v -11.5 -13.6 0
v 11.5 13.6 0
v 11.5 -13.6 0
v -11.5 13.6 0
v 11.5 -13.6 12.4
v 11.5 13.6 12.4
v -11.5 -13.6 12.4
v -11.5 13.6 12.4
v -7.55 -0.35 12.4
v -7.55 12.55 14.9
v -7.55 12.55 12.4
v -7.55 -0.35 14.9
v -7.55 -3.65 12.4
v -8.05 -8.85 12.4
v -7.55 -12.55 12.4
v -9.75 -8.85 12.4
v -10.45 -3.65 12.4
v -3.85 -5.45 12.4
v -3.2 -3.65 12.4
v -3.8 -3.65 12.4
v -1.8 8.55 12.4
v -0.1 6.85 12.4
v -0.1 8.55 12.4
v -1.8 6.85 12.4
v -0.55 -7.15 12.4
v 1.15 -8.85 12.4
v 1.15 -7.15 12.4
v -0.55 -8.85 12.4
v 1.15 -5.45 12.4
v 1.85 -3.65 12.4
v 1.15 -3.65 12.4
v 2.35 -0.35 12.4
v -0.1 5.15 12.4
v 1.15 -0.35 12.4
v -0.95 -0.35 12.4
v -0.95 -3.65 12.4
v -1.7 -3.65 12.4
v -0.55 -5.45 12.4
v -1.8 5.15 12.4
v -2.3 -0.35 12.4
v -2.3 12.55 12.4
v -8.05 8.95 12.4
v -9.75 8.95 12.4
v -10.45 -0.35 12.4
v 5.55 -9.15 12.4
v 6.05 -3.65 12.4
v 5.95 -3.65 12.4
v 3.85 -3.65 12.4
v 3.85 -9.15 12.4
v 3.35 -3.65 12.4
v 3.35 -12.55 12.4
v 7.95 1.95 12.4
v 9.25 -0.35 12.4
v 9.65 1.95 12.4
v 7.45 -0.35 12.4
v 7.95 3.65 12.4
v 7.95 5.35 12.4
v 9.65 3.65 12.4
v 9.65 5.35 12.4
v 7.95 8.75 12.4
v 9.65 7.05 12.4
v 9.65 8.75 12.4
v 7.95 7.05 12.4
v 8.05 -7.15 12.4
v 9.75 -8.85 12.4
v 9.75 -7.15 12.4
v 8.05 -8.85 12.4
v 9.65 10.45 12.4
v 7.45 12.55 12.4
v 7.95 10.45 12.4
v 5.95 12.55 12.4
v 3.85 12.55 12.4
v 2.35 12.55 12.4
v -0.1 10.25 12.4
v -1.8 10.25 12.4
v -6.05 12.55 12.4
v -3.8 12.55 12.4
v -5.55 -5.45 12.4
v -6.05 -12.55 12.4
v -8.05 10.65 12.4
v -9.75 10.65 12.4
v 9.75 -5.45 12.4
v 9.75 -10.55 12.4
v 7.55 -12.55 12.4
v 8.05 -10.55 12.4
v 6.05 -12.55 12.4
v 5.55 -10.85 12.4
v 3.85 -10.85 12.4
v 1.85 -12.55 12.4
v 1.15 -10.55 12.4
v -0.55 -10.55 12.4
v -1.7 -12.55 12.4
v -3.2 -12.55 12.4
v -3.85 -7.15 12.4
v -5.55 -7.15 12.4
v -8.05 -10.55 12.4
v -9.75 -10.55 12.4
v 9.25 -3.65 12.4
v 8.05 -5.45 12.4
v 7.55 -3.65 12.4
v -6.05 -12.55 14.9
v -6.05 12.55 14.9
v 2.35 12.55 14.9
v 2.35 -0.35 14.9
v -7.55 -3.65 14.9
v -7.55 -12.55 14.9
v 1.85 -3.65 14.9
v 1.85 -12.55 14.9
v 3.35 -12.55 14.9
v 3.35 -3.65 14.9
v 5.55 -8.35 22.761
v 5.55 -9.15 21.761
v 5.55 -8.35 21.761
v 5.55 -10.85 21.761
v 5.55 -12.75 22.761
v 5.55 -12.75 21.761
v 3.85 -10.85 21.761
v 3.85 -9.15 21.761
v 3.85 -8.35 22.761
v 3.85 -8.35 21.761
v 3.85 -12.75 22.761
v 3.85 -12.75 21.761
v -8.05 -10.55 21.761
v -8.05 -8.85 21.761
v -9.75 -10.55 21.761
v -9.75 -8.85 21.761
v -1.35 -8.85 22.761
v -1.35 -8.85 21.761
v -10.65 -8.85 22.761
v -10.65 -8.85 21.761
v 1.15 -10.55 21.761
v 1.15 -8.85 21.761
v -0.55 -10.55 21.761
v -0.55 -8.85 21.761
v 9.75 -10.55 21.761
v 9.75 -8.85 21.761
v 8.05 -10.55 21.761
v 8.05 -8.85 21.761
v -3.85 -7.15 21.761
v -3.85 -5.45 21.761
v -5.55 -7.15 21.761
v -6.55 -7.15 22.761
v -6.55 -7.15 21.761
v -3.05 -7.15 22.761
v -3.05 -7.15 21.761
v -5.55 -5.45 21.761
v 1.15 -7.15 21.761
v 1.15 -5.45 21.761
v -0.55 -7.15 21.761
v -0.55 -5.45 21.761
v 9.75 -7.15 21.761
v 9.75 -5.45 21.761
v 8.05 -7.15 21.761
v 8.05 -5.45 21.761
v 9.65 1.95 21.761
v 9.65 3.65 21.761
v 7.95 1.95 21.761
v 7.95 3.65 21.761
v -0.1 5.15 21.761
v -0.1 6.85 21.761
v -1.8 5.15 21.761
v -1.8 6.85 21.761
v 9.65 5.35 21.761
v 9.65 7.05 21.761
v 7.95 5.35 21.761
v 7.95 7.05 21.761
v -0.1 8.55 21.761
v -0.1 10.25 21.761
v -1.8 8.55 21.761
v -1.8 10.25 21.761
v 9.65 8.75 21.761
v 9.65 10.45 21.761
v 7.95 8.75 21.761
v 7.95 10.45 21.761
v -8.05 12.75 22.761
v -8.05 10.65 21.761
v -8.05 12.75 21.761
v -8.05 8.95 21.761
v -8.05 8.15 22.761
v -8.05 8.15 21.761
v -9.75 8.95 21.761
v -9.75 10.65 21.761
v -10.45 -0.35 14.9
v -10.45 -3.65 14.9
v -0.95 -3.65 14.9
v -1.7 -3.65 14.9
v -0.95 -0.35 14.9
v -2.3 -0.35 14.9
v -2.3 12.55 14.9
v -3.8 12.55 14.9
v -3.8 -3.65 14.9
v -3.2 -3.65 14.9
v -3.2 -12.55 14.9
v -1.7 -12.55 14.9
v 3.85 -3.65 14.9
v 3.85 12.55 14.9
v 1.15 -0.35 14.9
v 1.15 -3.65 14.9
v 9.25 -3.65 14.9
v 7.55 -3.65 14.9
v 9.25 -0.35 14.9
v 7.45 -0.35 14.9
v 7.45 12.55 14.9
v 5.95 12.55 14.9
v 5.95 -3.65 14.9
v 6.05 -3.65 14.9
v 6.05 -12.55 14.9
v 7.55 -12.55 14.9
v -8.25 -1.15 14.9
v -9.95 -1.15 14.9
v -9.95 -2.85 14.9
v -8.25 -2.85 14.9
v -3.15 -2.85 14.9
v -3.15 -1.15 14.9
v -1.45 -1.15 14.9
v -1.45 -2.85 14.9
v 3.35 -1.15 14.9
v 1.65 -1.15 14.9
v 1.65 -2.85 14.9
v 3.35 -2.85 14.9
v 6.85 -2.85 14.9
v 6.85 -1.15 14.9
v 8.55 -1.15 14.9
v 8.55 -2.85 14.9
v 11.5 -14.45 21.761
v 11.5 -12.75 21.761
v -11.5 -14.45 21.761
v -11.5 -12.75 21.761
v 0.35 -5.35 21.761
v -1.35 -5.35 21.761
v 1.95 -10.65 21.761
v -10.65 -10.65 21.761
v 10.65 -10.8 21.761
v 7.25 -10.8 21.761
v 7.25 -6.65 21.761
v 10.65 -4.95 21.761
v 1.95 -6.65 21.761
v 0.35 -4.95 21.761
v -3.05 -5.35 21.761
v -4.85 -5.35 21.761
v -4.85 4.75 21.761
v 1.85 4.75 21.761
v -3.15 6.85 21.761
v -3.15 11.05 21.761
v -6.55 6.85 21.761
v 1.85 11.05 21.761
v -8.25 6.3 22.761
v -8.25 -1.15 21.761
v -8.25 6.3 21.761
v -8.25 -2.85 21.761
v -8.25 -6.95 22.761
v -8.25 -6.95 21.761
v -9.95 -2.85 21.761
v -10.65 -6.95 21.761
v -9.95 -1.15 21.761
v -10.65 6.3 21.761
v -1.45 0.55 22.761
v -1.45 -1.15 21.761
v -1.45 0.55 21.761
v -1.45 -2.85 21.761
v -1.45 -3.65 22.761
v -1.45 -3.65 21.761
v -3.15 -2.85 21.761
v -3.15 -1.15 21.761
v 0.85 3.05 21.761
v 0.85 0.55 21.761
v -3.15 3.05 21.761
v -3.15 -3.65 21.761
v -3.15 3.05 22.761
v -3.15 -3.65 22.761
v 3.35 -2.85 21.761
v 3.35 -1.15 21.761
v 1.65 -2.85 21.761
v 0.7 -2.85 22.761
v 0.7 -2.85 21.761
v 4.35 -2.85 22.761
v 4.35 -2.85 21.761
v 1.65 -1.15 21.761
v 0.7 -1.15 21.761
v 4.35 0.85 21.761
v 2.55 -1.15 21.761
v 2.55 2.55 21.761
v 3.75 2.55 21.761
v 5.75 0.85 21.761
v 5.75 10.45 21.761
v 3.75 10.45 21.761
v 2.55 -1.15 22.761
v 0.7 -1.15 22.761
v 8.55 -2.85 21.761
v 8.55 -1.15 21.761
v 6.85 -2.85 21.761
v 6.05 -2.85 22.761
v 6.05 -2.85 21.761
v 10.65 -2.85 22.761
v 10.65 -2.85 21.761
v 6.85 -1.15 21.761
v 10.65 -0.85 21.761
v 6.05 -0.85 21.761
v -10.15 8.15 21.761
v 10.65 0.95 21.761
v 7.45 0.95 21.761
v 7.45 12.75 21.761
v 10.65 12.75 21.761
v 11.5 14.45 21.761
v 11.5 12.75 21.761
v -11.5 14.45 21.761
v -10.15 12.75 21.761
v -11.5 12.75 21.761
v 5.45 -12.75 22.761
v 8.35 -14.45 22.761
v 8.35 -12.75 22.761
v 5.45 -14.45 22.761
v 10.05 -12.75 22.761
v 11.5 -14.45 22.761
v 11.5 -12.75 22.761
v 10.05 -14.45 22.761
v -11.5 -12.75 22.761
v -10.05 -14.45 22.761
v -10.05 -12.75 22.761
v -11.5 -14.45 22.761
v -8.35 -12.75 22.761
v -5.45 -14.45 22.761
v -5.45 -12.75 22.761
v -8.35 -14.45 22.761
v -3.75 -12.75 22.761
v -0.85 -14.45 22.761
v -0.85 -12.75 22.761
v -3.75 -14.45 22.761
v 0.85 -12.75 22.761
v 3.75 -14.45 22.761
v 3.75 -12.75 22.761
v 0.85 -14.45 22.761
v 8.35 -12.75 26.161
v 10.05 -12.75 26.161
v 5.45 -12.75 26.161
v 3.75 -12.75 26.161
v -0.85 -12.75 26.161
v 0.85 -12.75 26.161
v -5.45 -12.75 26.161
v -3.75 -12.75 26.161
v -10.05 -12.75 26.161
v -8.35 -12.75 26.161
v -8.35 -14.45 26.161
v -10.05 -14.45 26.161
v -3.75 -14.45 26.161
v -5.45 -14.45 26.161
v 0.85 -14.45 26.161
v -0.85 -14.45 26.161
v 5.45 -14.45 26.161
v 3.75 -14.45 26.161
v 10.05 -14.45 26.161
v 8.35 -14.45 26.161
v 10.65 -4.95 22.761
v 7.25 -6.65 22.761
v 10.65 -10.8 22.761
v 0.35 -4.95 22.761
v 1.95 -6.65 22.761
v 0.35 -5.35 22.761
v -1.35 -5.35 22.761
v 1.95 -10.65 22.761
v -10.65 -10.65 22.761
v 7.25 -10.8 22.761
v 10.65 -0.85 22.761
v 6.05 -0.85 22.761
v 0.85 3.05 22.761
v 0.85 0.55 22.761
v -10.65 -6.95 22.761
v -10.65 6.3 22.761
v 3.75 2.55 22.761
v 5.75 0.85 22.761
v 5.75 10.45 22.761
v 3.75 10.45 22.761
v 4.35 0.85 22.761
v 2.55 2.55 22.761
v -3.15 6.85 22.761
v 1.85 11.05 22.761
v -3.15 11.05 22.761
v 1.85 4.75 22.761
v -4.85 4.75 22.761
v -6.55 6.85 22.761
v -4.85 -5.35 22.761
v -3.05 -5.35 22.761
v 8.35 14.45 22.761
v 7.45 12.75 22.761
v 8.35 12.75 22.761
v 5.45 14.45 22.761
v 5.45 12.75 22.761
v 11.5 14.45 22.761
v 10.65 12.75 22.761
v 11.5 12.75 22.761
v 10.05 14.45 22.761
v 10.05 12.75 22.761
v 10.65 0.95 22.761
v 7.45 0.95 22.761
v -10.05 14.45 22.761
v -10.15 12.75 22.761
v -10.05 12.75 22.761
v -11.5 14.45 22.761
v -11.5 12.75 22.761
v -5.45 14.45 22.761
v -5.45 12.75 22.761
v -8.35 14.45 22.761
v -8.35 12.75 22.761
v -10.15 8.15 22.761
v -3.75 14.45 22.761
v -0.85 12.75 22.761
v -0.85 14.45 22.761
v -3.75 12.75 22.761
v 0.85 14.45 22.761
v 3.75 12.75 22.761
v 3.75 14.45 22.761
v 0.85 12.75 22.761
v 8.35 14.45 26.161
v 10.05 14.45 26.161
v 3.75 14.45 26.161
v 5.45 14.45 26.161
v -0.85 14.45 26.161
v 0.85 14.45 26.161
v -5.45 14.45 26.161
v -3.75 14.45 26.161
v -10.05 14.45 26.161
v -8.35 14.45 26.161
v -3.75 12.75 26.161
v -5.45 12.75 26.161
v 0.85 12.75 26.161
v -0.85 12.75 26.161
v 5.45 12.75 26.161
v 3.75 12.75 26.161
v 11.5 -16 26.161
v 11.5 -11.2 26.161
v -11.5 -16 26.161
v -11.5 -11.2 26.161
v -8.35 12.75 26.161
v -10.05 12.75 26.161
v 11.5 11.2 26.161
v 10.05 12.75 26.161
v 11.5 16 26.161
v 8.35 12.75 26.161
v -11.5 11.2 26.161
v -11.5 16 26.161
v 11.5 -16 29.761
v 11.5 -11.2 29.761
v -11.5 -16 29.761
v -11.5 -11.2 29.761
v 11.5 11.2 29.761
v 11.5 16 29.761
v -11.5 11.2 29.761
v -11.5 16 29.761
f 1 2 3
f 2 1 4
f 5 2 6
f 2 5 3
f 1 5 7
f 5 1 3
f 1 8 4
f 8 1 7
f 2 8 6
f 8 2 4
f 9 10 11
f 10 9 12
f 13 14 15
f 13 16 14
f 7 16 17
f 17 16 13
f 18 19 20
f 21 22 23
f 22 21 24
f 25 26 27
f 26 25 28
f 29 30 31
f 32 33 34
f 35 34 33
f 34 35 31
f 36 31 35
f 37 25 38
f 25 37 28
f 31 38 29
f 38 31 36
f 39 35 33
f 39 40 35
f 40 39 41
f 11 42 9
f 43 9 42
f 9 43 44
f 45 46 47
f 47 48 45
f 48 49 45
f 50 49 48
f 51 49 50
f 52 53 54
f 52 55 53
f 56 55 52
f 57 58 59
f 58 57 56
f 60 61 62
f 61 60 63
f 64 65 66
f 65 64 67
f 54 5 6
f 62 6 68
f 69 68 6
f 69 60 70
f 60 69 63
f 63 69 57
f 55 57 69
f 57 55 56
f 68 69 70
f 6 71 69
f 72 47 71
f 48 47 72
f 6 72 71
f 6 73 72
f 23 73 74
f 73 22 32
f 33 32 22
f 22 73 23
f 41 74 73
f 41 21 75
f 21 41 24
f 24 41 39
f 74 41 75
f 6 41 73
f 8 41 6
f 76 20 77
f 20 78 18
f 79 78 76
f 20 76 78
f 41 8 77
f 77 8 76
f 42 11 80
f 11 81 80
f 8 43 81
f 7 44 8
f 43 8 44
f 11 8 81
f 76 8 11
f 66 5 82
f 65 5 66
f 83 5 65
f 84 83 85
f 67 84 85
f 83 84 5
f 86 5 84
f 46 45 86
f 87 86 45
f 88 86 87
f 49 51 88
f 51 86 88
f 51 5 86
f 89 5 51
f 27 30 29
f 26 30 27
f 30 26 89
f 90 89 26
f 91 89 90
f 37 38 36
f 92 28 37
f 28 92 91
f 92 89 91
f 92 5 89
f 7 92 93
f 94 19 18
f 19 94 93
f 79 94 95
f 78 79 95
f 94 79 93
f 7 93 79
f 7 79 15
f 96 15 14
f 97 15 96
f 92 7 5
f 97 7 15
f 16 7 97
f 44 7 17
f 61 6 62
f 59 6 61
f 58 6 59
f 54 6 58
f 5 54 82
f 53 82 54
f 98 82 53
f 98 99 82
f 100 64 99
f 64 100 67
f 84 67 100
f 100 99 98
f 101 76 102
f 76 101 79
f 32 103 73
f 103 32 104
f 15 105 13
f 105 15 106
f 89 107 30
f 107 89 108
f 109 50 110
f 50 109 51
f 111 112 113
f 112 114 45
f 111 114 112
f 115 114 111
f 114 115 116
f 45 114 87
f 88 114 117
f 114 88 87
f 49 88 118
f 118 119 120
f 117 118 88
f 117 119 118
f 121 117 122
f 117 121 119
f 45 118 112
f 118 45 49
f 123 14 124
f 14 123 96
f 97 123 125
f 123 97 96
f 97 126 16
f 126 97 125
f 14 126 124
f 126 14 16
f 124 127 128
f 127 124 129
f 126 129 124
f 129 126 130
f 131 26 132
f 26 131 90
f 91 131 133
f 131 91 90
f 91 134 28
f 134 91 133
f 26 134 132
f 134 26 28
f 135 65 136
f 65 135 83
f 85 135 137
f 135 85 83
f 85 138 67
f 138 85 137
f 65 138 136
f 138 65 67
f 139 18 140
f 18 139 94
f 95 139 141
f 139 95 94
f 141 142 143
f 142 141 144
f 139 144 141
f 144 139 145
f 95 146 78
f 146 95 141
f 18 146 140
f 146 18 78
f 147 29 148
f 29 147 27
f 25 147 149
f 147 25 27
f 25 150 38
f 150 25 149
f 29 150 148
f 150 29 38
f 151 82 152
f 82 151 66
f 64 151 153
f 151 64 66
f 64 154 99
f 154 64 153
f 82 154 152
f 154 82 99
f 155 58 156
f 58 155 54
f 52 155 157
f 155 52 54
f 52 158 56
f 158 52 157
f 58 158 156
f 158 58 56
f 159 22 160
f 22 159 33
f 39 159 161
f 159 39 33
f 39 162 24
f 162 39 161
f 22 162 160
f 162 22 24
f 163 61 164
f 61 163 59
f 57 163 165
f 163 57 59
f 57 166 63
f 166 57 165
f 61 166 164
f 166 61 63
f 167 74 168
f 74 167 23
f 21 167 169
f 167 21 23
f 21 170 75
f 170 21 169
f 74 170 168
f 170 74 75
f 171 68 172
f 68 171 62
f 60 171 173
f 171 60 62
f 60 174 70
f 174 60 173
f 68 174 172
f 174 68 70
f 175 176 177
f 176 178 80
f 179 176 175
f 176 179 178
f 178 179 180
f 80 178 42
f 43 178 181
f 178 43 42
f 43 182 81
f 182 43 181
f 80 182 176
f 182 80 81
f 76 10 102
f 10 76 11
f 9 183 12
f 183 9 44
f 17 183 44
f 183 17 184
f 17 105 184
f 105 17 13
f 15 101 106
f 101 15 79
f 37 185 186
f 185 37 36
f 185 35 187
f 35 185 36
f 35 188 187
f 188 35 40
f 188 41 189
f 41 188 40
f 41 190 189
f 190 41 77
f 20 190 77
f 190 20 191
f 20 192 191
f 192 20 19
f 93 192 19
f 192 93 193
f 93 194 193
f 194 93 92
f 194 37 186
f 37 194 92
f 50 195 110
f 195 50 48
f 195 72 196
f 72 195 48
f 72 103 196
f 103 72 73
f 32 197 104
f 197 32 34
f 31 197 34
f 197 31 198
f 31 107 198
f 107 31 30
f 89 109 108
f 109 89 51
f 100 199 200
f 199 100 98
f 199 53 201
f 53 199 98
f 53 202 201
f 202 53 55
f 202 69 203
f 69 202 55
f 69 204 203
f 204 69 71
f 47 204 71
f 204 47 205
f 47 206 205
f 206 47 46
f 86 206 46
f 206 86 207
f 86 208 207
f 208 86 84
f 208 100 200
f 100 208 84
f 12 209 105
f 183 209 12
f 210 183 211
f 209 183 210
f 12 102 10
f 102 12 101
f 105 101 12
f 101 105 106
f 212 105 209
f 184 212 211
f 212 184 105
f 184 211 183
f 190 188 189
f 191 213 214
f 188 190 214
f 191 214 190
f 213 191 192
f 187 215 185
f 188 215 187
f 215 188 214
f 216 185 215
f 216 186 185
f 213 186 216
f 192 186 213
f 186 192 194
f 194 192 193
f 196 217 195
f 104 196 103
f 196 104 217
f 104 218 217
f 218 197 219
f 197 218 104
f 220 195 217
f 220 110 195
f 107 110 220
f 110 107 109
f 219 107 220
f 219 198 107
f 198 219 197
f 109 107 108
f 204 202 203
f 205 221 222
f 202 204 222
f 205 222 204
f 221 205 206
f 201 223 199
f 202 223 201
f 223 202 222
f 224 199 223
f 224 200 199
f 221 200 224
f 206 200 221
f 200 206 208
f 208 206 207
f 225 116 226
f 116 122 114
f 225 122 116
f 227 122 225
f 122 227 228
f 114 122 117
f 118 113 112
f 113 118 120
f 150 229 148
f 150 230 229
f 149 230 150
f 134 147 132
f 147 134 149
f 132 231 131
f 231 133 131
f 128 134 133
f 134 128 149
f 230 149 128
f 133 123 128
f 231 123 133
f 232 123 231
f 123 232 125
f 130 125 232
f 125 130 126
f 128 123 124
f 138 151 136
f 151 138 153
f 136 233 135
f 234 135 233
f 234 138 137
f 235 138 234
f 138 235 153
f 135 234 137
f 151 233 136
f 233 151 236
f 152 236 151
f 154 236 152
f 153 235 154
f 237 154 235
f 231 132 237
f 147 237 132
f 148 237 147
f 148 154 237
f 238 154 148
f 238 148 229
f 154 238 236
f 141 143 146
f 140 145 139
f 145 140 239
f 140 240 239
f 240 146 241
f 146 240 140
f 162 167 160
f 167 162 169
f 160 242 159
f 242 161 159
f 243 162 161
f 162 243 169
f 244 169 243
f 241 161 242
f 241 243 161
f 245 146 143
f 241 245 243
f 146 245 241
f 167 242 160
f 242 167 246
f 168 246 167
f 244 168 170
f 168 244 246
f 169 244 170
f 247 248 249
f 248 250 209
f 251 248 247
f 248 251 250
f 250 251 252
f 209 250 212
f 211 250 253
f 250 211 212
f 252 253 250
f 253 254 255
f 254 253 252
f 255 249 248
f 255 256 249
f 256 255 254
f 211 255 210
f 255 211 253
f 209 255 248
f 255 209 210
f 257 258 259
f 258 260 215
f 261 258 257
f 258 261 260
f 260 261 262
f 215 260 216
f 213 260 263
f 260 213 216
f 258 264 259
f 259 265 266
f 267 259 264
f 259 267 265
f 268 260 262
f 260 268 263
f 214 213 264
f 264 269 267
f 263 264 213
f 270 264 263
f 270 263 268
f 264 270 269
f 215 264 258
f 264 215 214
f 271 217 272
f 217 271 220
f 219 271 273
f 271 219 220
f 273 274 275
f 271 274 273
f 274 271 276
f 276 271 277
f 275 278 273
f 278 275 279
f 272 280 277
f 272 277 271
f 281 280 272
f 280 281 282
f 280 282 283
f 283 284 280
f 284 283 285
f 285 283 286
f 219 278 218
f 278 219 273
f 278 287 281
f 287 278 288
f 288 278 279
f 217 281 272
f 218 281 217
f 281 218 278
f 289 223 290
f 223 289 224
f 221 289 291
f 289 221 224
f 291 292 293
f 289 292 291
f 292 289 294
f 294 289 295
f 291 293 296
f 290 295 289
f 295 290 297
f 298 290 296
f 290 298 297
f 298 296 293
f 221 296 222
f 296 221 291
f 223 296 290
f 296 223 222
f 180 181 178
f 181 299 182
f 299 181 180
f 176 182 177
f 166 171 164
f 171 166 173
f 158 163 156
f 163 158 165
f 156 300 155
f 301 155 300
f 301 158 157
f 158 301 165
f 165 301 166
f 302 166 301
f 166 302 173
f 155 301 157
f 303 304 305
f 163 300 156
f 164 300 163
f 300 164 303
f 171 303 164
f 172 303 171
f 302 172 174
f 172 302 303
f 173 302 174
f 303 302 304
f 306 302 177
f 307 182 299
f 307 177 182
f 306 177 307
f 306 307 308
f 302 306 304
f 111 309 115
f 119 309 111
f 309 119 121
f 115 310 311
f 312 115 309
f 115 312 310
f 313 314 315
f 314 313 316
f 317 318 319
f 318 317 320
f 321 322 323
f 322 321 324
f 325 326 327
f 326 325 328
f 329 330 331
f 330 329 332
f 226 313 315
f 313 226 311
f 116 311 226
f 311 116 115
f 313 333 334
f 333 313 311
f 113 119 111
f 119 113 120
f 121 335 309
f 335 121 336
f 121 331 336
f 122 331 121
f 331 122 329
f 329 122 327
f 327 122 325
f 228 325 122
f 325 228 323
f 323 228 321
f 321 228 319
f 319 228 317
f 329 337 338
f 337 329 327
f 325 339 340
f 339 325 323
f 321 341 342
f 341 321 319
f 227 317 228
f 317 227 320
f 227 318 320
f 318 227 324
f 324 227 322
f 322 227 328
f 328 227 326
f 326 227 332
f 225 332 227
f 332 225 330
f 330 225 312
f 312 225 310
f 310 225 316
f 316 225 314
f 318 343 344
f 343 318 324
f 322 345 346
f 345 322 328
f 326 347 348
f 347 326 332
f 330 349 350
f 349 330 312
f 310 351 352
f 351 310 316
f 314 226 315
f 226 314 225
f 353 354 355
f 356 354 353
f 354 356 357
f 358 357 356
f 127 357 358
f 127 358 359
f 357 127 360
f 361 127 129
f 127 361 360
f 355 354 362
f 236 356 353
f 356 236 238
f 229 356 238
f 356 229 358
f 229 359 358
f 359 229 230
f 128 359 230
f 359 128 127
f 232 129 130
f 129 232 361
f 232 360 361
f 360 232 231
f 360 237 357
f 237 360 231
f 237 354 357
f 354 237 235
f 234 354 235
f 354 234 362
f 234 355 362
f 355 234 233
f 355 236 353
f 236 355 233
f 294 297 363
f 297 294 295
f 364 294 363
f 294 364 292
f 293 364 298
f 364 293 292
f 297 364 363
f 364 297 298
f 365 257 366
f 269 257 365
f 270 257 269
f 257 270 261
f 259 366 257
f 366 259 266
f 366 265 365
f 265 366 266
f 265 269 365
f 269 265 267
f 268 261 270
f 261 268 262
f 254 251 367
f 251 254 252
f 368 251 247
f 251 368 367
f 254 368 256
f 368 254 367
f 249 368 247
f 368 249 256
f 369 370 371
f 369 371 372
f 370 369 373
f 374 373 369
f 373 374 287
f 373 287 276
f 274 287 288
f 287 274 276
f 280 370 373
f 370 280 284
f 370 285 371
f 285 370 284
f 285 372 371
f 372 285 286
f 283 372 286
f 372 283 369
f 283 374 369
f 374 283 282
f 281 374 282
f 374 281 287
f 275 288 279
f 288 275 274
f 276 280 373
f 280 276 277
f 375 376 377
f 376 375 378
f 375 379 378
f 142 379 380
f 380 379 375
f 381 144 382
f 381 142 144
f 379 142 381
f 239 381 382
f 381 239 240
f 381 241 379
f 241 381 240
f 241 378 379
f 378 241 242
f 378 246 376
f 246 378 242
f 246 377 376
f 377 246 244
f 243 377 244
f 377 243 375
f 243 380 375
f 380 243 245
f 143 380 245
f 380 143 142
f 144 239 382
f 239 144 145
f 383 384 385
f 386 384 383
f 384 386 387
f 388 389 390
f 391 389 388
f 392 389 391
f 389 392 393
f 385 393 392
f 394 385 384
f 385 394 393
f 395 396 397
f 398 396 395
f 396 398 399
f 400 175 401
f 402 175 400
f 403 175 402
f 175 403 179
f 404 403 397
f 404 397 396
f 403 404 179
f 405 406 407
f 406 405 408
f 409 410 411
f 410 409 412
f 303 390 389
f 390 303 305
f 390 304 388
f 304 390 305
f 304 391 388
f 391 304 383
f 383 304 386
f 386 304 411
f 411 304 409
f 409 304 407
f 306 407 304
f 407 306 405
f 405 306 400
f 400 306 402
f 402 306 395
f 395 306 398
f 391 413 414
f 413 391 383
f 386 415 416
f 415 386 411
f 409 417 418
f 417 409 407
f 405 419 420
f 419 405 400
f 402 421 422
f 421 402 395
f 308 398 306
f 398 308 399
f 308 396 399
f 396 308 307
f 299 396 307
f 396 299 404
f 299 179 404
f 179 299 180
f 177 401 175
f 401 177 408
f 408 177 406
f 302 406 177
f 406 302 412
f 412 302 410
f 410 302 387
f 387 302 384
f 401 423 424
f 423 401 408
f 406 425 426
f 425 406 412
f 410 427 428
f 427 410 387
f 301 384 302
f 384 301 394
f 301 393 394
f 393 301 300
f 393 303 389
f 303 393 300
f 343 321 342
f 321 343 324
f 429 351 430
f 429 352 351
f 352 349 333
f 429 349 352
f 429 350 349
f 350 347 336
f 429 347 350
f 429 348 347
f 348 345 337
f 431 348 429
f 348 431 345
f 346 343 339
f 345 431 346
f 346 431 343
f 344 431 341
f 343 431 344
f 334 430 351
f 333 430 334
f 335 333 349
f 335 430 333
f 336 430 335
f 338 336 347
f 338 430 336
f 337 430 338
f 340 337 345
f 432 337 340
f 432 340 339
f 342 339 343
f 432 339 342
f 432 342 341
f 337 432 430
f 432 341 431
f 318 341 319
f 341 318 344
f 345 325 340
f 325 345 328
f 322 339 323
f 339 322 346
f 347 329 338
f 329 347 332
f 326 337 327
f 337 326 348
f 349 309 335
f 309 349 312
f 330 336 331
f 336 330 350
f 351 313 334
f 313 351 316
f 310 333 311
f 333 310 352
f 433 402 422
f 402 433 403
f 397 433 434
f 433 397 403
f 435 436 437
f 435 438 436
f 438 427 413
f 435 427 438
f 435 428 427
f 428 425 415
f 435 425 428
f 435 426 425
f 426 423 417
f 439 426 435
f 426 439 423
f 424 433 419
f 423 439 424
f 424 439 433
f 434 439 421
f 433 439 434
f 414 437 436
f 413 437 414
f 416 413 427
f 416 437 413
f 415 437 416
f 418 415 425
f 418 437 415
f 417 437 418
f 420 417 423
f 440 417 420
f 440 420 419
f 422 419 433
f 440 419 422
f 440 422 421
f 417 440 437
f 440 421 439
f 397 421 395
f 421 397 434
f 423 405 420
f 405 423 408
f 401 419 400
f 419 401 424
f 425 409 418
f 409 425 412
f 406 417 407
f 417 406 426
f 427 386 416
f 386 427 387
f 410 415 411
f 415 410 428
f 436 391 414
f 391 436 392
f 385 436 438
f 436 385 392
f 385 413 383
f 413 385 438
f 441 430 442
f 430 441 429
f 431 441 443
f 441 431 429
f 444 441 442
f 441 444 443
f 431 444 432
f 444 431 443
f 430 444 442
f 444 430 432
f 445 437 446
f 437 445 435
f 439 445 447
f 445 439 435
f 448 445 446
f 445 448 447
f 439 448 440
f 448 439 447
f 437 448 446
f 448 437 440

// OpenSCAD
// Generated by SolidPython 0.4.2 on 2020-09-29 23:21:52
//!OpenSCAD

scale(v = 0.0100000000) {
	translate(v = [-1150, -1360, 0]) {
		union() {
			color(c = [0.4000000000, 0.4000000000, 0.4000000000]) {
				translate(v = [0, 0, 0]) {
					linear_extrude(height = 1000.0000000000) {
						polygon(paths = [[0, 1, 2, 3]], points = [[0, 0], [0, 2720], [2300, 2720], [2300, 0]]);
					}
				}
			}
			color(c = [0.2000000000, 0.6000000000, 0.2000000000]) {
				translate(v = [0, 0, 1000.0000000000]) {
					linear_extrude(height = 120.0000000000) {
						polygon(paths = [[0, 1, 2, 3]], points = [[0, 1305], [0, 2720], [2300, 2720], [2300, 1305]]);
					}
				}
			}
			color(c = [0.4000000000, 0.4000000000, 0.4000000000]) {
				translate(v = [0, 0, 1000.0000000000]) {
					linear_extrude(height = 120.0000000000) {
						polygon(paths = [[0, 1, 2, 3]], points = [[0, 0], [0, 1305], [2300, 1305], [2300, 0]]);
					}
				}
			}
			color(c = [0.9000000000, 0.6000000000, 0.6000000000]) {
				translate(v = [0, 0, 1120.0000000000]) {
					linear_extrude(height = 120.0000000000) {
						polygon(paths = [[0, 1, 2, 3]], points = [[135, 1485], [135, 2485], [395, 2485], [395, 1485]]);
					}
				}
			}
			color(c = [0.9000000000, 0.6000000000, 0.6000000000]) {
				translate(v = [0, 0, 1120.0000000000]) {
					linear_extrude(height = 120.0000000000) {
						polygon(paths = [[0, 1, 2, 3]], points = [[545, 1485], [545, 2485], [770, 2485], [770, 1485]]);
					}
				}
			}
			color(c = [0.9000000000, 0.6000000000, 0.6000000000]) {
				translate(v = [0, 0, 1120.0000000000]) {
					linear_extrude(height = 120.0000000000) {
						polygon(paths = [[0, 1, 2, 3]], points = [[920, 1485], [920, 2485], [1385, 2485], [1385, 1485]]);
					}
				}
			}
			color(c = [0.9000000000, 0.6000000000, 0.6000000000]) {
				translate(v = [0, 0, 1120.0000000000]) {
					linear_extrude(height = 120.0000000000) {
						polygon(paths = [[0, 1, 2, 3]], points = [[1535, 1485], [1535, 2485], [1745, 2485], [1745, 1485]]);
					}
				}
			}
			color(c = [0.9000000000, 0.6000000000, 0.6000000000]) {
				translate(v = [0, 0, 1120.0000000000]) {
					linear_extrude(height = 120.0000000000) {
						polygon(paths = [[0, 1, 2, 3]], points = [[1895, 1485], [1895, 2485], [2165, 2485], [2165, 1485]]);
					}
				}
			}
			color(c = [0.9000000000, 0.6000000000, 0.9000000000]) {
				translate(v = [0, 0, 1120.0000000000]) {
					linear_extrude(height = 120.0000000000) {
						polygon(paths = [[0, 1, 2, 3]], points = [[135, 235], [135, 885], [395, 885], [395, 235]]);
					}
				}
			}
			color(c = [0.9000000000, 0.6000000000, 0.9000000000]) {
				translate(v = [0, 0, 1120.0000000000]) {
					linear_extrude(height = 120.0000000000) {
						polygon(paths = [[0, 1, 2, 3]], points = [[545, 235], [545, 885], [830, 885], [830, 235]]);
					}
				}
			}
			color(c = [0.9000000000, 0.6000000000, 0.9000000000]) {
				translate(v = [0, 0, 1120.0000000000]) {
					linear_extrude(height = 120.0000000000) {
						polygon(paths = [[0, 1, 2, 3]], points = [[980, 235], [980, 885], [1335, 885], [1335, 235]]);
					}
				}
			}
			color(c = [0.9000000000, 0.6000000000, 0.9000000000]) {
				translate(v = [0, 0, 1120.0000000000]) {
					linear_extrude(height = 120.0000000000) {
						polygon(paths = [[0, 1, 2, 3]], points = [[1485, 235], [1485, 885], [1755, 885], [1755, 235]]);
					}
				}
			}
			color(c = [0.9000000000, 0.6000000000, 0.9000000000]) {
				translate(v = [0, 0, 1120.0000000000]) {
					linear_extrude(height = 120.0000000000) {
						polygon(paths = [[0, 1, 2, 3]], points = [[1905, 235], [1905, 885], [2165, 885], [2165, 235]]);
					}
				}
			}
			color(c = [0.2000000000, 0.6000000000, 0.2000000000]) {
				translate(v = [0, 0, 1120.0000000000]) {
					linear_extrude(height = 120.0000000000) {
						difference() {
							polygon(paths = [[0, 1, 2, 3]], points = [[0, 1305], [0, 2720], [2300, 2720], [2300, 1305]]);
							polygon(paths = [[0, 1, 2, 3]], points = [[135, 1485], [395, 1485], [395, 2485], [135, 2485]]);
							polygon(paths = [[0, 1, 2, 3]], points = [[545, 1485], [770, 1485], [770, 2485], [545, 2485]]);
							polygon(paths = [[0, 1, 2, 3]], points = [[920, 1485], [1385, 1485], [1385, 2485], [920, 2485]]);
							polygon(paths = [[0, 1, 2, 3]], points = [[1535, 1485], [1745, 1485], [1745, 2485], [1535, 2485]]);
							polygon(paths = [[0, 1, 2, 3]], points = [[1895, 1485], [2165, 1485], [2165, 2485], [1895, 2485]]);
						}
					}
				}
			}
			color(c = [0.4000000000, 0.4000000000, 0.4000000000]) {
				translate(v = [0, 0, 1120.0000000000]) {
					linear_extrude(height = 120.0000000000) {
						difference() {
							polygon(paths = [[0, 1, 2, 3]], points = [[0, 0], [0, 1305], [2300, 1305], [2300, 0]]);
							polygon(paths = [[0, 1, 2, 3]], points = [[135, 235], [395, 235], [395, 885], [135, 885]]);
							polygon(paths = [[0, 1, 2, 3]], points = [[545, 235], [830, 235], [830, 885], [545, 885]]);
							polygon(paths = [[0, 1, 2, 3]], points = [[980, 235], [1335, 235], [1335, 885], [980, 885]]);
							polygon(paths = [[0, 1, 2, 3]], points = [[1485, 235], [1755, 235], [1755, 885], [1485, 885]]);
							polygon(paths = [[0, 1, 2, 3]], points = [[1905, 235], [2165, 235], [2165, 885], [1905, 885]]);
						}
					}
				}
			}
			color(c = [0.1000000000, 0.1000000000, 0.1000000000]) {
				translate(v = [0, 0, 1240.0000000000]) {
					linear_extrude(height = 70.0000000000) {
						polygon(paths = [[0, 1, 2, 3]], points = [[1535, 275], [1535, 445], [1705, 445], [1705, 275]]);
					}
				}
			}
			color(c = [0.1000000000, 0.1000000000, 0.1000000000]) {
				translate(v = [0, 0, 1240.0000000000]) {
					linear_extrude(height = 70.0000000000) {
						polygon(paths = [[0, 1, 2, 3]], points = [[175, 305], [175, 475], [345, 475], [345, 305]]);
					}
				}
			}
			color(c = [0.1000000000, 0.1000000000, 0.1000000000]) {
				translate(v = [0, 0, 1240.0000000000]) {
					linear_extrude(height = 70.0000000000) {
						polygon(paths = [[0, 1, 2, 3]], points = [[1095, 305], [1095, 475], [1265, 475], [1265, 305]]);
					}
				}
			}
			color(c = [0.1000000000, 0.1000000000, 0.1000000000]) {
				translate(v = [0, 0, 1240.0000000000]) {
					linear_extrude(height = 70.0000000000) {
						polygon(paths = [[0, 1, 2, 3]], points = [[1955, 305], [1955, 475], [2125, 475], [2125, 305]]);
					}
				}
			}
			color(c = [0.1000000000, 0.1000000000, 0.1000000000]) {
				translate(v = [0, 0, 1240.0000000000]) {
					linear_extrude(height = 70.0000000000) {
						polygon(paths = [[0, 1, 2, 3]], points = [[595, 645], [595, 815], [765, 815], [765, 645]]);
					}
				}
			}
			color(c = [0.1000000000, 0.1000000000, 0.1000000000]) {
				translate(v = [0, 0, 1240.0000000000]) {
					linear_extrude(height = 70.0000000000) {
						polygon(paths = [[0, 1, 2, 3]], points = [[1095, 645], [1095, 815], [1265, 815], [1265, 645]]);
					}
				}
			}
			color(c = [0.1000000000, 0.1000000000, 0.1000000000]) {
				translate(v = [0, 0, 1240.0000000000]) {
					linear_extrude(height = 70.0000000000) {
						polygon(paths = [[0, 1, 2, 3]], points = [[1955, 645], [1955, 815], [2125, 815], [2125, 645]]);
					}
				}
			}
			color(c = [0.1000000000, 0.1000000000, 0.1000000000]) {
				translate(v = [0, 0, 1240.0000000000]) {
					linear_extrude(height = 70.0000000000) {
						polygon(paths = [[0, 1, 2, 3]], points = [[1945, 1555], [1945, 1725], [2115, 1725], [2115, 1555]]);
					}
				}
			}
			color(c = [0.1000000000, 0.1000000000, 0.1000000000]) {
				translate(v = [0, 0, 1240.0000000000]) {
					linear_extrude(height = 70.0000000000) {
						polygon(paths = [[0, 1, 2, 3]], points = [[970, 1875], [970, 2045], [1140, 2045], [1140, 1875]]);
					}
				}
			}
			color(c = [0.1000000000, 0.1000000000, 0.1000000000]) {
				translate(v = [0, 0, 1240.0000000000]) {
					linear_extrude(height = 70.0000000000) {
						polygon(paths = [[0, 1, 2, 3]], points = [[1945, 1895], [1945, 2065], [2115, 2065], [2115, 1895]]);
					}
				}
			}
			color(c = [0.1000000000, 0.1000000000, 0.1000000000]) {
				translate(v = [0, 0, 1240.0000000000]) {
					linear_extrude(height = 70.0000000000) {
						polygon(paths = [[0, 1, 2, 3]], points = [[970, 2215], [970, 2385], [1140, 2385], [1140, 2215]]);
					}
				}
			}
			color(c = [0.1000000000, 0.1000000000, 0.1000000000]) {
				translate(v = [0, 0, 1240.0000000000]) {
					linear_extrude(height = 70.0000000000) {
						polygon(paths = [[0, 1, 2, 3]], points = [[1945, 2235], [1945, 2405], [2115, 2405], [2115, 2235]]);
					}
				}
			}
			color(c = [0.1000000000, 0.1000000000, 0.1000000000]) {
				translate(v = [0, 0, 1240.0000000000]) {
					linear_extrude(height = 70.0000000000) {
						polygon(paths = [[0, 1, 2, 3]], points = [[175, 2255], [175, 2425], [345, 2425], [345, 2255]]);
					}
				}
			}
			color(c = [1.0000000000, 1.0000000000, 1.0000000000]) {
				translate(v = [0, 0, 1240.0000000000]) {
					linear_extrude(height = 70.0000000000) {
						polygon(paths = [[0, 1, 2, 3, 4, 5, 6, 7]], points = [[395, 105], [395, 995], [105, 995], [105, 1325], [395, 1325], [395, 2615], [545, 2615], [545, 105]]);
					}
				}
			}
			color(c = [1.0000000000, 1.0000000000, 1.0000000000]) {
				translate(v = [0, 0, 1240.0000000000]) {
					linear_extrude(height = 70.0000000000) {
						polygon(paths = [[0, 1, 2, 3, 4, 5, 6, 7, 8, 9]], points = [[830, 105], [830, 995], [770, 995], [770, 2615], [920, 2615], [920, 1325], [1055, 1325], [1055, 995], [980, 995], [980, 105]]);
					}
				}
			}
			color(c = [1.0000000000, 1.0000000000, 1.0000000000]) {
				translate(v = [0, 0, 1240.0000000000]) {
					linear_extrude(height = 70.0000000000) {
						polygon(paths = [[0, 1, 2, 3, 4, 5, 6, 7, 8, 9]], points = [[1335, 105], [1335, 995], [1265, 995], [1265, 1325], [1385, 1325], [1385, 2615], [1535, 2615], [1535, 995], [1485, 995], [1485, 105]]);
					}
				}
			}
			color(c = [1.0000000000, 1.0000000000, 1.0000000000]) {
				translate(v = [0, 0, 1240.0000000000]) {
					linear_extrude(height = 70.0000000000) {
						polygon(paths = [[0, 1, 2, 3, 4, 5, 6, 7, 8, 9]], points = [[1755, 105], [1755, 995], [1745, 995], [1745, 2615], [1895, 2615], [1895, 1325], [2075, 1325], [2075, 995], [1905, 995], [1905, 105]]);
					}
				}
			}
			color(c = [0.1000000000, 0.1000000000, 0.1000000000]) {
				translate(v = [0, 0, 1310.0000000000]) {
					linear_extrude(height = 180.0000000000) {
						polygon(paths = [[0, 1, 2, 3]], points = [[1535, 275], [1535, 445], [1705, 445], [1705, 275]]);
					}
				}
			}
			color(c = [0.1000000000, 0.1000000000, 0.1000000000]) {
				translate(v = [0, 0, 1310.0000000000]) {
					linear_extrude(height = 180.0000000000) {
						polygon(paths = [[0, 1, 2, 3]], points = [[175, 305], [175, 475], [345, 475], [345, 305]]);
					}
				}
			}
			color(c = [0.1000000000, 0.1000000000, 0.1000000000]) {
				translate(v = [0, 0, 1310.0000000000]) {
					linear_extrude(height = 180.0000000000) {
						polygon(paths = [[0, 1, 2, 3]], points = [[1095, 305], [1095, 475], [1265, 475], [1265, 305]]);
					}
				}
			}
			color(c = [0.1000000000, 0.1000000000, 0.1000000000]) {
				translate(v = [0, 0, 1310.0000000000]) {
					linear_extrude(height = 180.0000000000) {
						polygon(paths = [[0, 1, 2, 3]], points = [[1955, 305], [1955, 475], [2125, 475], [2125, 305]]);
					}
				}
			}
			color(c = [0.1000000000, 0.1000000000, 0.1000000000]) {
				translate(v = [0, 0, 1310.0000000000]) {
					linear_extrude(height = 180.0000000000) {
						polygon(paths = [[0, 1, 2, 3]], points = [[595, 645], [595, 815], [765, 815], [765, 645]]);
					}
				}
			}
			color(c = [0.1000000000, 0.1000000000, 0.1000000000]) {
				translate(v = [0, 0, 1310.0000000000]) {
					linear_extrude(height = 180.0000000000) {
						polygon(paths = [[0, 1, 2, 3]], points = [[1095, 645], [1095, 815], [1265, 815], [1265, 645]]);
					}
				}
			}
			color(c = [0.1000000000, 0.1000000000, 0.1000000000]) {
				translate(v = [0, 0, 1310.0000000000]) {
					linear_extrude(height = 180.0000000000) {
						polygon(paths = [[0, 1, 2, 3]], points = [[1955, 645], [1955, 815], [2125, 815], [2125, 645]]);
					}
				}
			}
			color(c = [0.1000000000, 0.1000000000, 0.1000000000]) {
				translate(v = [0, 0, 1310.0000000000]) {
					linear_extrude(height = 180.0000000000) {
						polygon(paths = [[0, 1, 2, 3]], points = [[1945, 1555], [1945, 1725], [2115, 1725], [2115, 1555]]);
					}
				}
			}
			color(c = [0.1000000000, 0.1000000000, 0.1000000000]) {
				translate(v = [0, 0, 1310.0000000000]) {
					linear_extrude(height = 180.0000000000) {
						polygon(paths = [[0, 1, 2, 3]], points = [[970, 1875], [970, 2045], [1140, 2045], [1140, 1875]]);
					}
				}
			}
			color(c = [0.1000000000, 0.1000000000, 0.1000000000]) {
				translate(v = [0, 0, 1310.0000000000]) {
					linear_extrude(height = 180.0000000000) {
						polygon(paths = [[0, 1, 2, 3]], points = [[1945, 1895], [1945, 2065], [2115, 2065], [2115, 1895]]);
					}
				}
			}
			color(c = [0.1000000000, 0.1000000000, 0.1000000000]) {
				translate(v = [0, 0, 1310.0000000000]) {
					linear_extrude(height = 180.0000000000) {
						polygon(paths = [[0, 1, 2, 3]], points = [[970, 2215], [970, 2385], [1140, 2385], [1140, 2215]]);
					}
				}
			}
			color(c = [0.1000000000, 0.1000000000, 0.1000000000]) {
				translate(v = [0, 0, 1310.0000000000]) {
					linear_extrude(height = 180.0000000000) {
						polygon(paths = [[0, 1, 2, 3]], points = [[1945, 2235], [1945, 2405], [2115, 2405], [2115, 2235]]);
					}
				}
			}
			color(c = [0.1000000000, 0.1000000000, 0.1000000000]) {
				translate(v = [0, 0, 1310.0000000000]) {
					linear_extrude(height = 180.0000000000) {
						polygon(paths = [[0, 1, 2, 3]], points = [[175, 2255], [175, 2425], [345, 2425], [345, 2255]]);
					}
				}
			}
			color(c = [0.7000000000, 0, 0]) {
				translate(v = [0, 0, 1310.0000000000]) {
					linear_extrude(height = 180.0000000000) {
						polygon(paths = [[0, 1, 2, 3, 4, 5, 6, 7]], points = [[395, 105], [395, 995], [105, 995], [105, 1325], [395, 1325], [395, 2615], [545, 2615], [545, 105]]);
					}
				}
			}
			color(c = [0.7000000000, 0, 0]) {
				translate(v = [0, 0, 1310.0000000000]) {
					linear_extrude(height = 180.0000000000) {
						polygon(paths = [[0, 1, 2, 3, 4, 5, 6, 7, 8, 9]], points = [[830, 105], [830, 995], [770, 995], [770, 2615], [920, 2615], [920, 1325], [1055, 1325], [1055, 995], [980, 995], [980, 105]]);
					}
				}
			}
			color(c = [0.7000000000, 0, 0]) {
				translate(v = [0, 0, 1310.0000000000]) {
					linear_extrude(height = 180.0000000000) {
						polygon(paths = [[0, 1, 2, 3, 4, 5, 6, 7, 8, 9]], points = [[1335, 105], [1335, 995], [1265, 995], [1265, 1325], [1385, 1325], [1385, 2615], [1535, 2615], [1535, 995], [1485, 995], [1485, 105]]);
					}
				}
			}
			color(c = [0.7000000000, 0, 0]) {
				translate(v = [0, 0, 1310.0000000000]) {
					linear_extrude(height = 180.0000000000) {
						polygon(paths = [[0, 1, 2, 3, 4, 5, 6, 7, 8, 9]], points = [[1755, 105], [1755, 995], [1745, 995], [1745, 2615], [1895, 2615], [1895, 1325], [2075, 1325], [2075, 995], [1905, 995], [1905, 105]]);
					}
				}
			}
			color(c = [0.1000000000, 0.1000000000, 0.1000000000]) {
				translate(v = [0, 0, 1490.0000000000]) {
					linear_extrude(height = 686.1000000000) {
						polygon(paths = [[0, 1, 2, 3]], points = [[1535, 275], [1535, 445], [1705, 445], [1705, 275]]);
					}
				}
			}
			color(c = [0.1000000000, 0.1000000000, 0.1000000000]) {
				translate(v = [0, 0, 1490.0000000000]) {
					linear_extrude(height = 686.1000000000) {
						polygon(paths = [[0, 1, 2, 3]], points = [[175, 305], [175, 475], [345, 475], [345, 305]]);
					}
				}
			}
			color(c = [0.1000000000, 0.1000000000, 0.1000000000]) {
				translate(v = [0, 0, 1490.0000000000]) {
					linear_extrude(height = 686.1000000000) {
						polygon(paths = [[0, 1, 2, 3]], points = [[1095, 305], [1095, 475], [1265, 475], [1265, 305]]);
					}
				}
			}
			color(c = [0.1000000000, 0.1000000000, 0.1000000000]) {
				translate(v = [0, 0, 1490.0000000000]) {
					linear_extrude(height = 686.1000000000) {
						polygon(paths = [[0, 1, 2, 3]], points = [[1955, 305], [1955, 475], [2125, 475], [2125, 305]]);
					}
				}
			}
			color(c = [0.1000000000, 0.1000000000, 0.1000000000]) {
				translate(v = [0, 0, 1490.0000000000]) {
					linear_extrude(height = 686.1000000000) {
						polygon(paths = [[0, 1, 2, 3]], points = [[595, 645], [595, 815], [765, 815], [765, 645]]);
					}
				}
			}
			color(c = [0.1000000000, 0.1000000000, 0.1000000000]) {
				translate(v = [0, 0, 1490.0000000000]) {
					linear_extrude(height = 686.1000000000) {
						polygon(paths = [[0, 1, 2, 3]], points = [[1095, 645], [1095, 815], [1265, 815], [1265, 645]]);
					}
				}
			}
			color(c = [0.1000000000, 0.1000000000, 0.1000000000]) {
				translate(v = [0, 0, 1490.0000000000]) {
					linear_extrude(height = 686.1000000000) {
						polygon(paths = [[0, 1, 2, 3]], points = [[1955, 645], [1955, 815], [2125, 815], [2125, 645]]);
					}
				}
			}
			color(c = [0.1000000000, 0.1000000000, 0.1000000000]) {
				translate(v = [0, 0, 1490.0000000000]) {
					linear_extrude(height = 686.1000000000) {
						polygon(paths = [[0, 1, 2, 3]], points = [[155, 1075], [155, 1245], [325, 1245], [325, 1075]]);
					}
				}
			}
			color(c = [0.1000000000, 0.1000000000, 0.1000000000]) {
				translate(v = [0, 0, 1490.0000000000]) {
					linear_extrude(height = 686.1000000000) {
						polygon(paths = [[0, 1, 2, 3]], points = [[835, 1075], [835, 1245], [1005, 1245], [1005, 1075]]);
					}
				}
			}
			color(c = [0.1000000000, 0.1000000000, 0.1000000000]) {
				translate(v = [0, 0, 1490.0000000000]) {
					linear_extrude(height = 686.1000000000) {
						polygon(paths = [[0, 1, 2, 3]], points = [[1315, 1075], [1315, 1245], [1485, 1245], [1485, 1075]]);
					}
				}
			}
			color(c = [0.1000000000, 0.1000000000, 0.1000000000]) {
				translate(v = [0, 0, 1490.0000000000]) {
					linear_extrude(height = 686.1000000000) {
						polygon(paths = [[0, 1, 2, 3]], points = [[1835, 1075], [1835, 1245], [2005, 1245], [2005, 1075]]);
					}
				}
			}
			color(c = [0.1000000000, 0.1000000000, 0.1000000000]) {
				translate(v = [0, 0, 1490.0000000000]) {
					linear_extrude(height = 686.1000000000) {
						polygon(paths = [[0, 1, 2, 3]], points = [[1945, 1555], [1945, 1725], [2115, 1725], [2115, 1555]]);
					}
				}
			}
			color(c = [0.1000000000, 0.1000000000, 0.1000000000]) {
				translate(v = [0, 0, 1490.0000000000]) {
					linear_extrude(height = 686.1000000000) {
						polygon(paths = [[0, 1, 2, 3]], points = [[970, 1875], [970, 2045], [1140, 2045], [1140, 1875]]);
					}
				}
			}
			color(c = [0.1000000000, 0.1000000000, 0.1000000000]) {
				translate(v = [0, 0, 1490.0000000000]) {
					linear_extrude(height = 686.1000000000) {
						polygon(paths = [[0, 1, 2, 3]], points = [[1945, 1895], [1945, 2065], [2115, 2065], [2115, 1895]]);
					}
				}
			}
			color(c = [0.1000000000, 0.1000000000, 0.1000000000]) {
				translate(v = [0, 0, 1490.0000000000]) {
					linear_extrude(height = 686.1000000000) {
						polygon(paths = [[0, 1, 2, 3]], points = [[970, 2215], [970, 2385], [1140, 2385], [1140, 2215]]);
					}
				}
			}
			color(c = [0.1000000000, 0.1000000000, 0.1000000000]) {
				translate(v = [0, 0, 1490.0000000000]) {
					linear_extrude(height = 686.1000000000) {
						polygon(paths = [[0, 1, 2, 3]], points = [[1945, 2235], [1945, 2405], [2115, 2405], [2115, 2235]]);
					}
				}
			}
			color(c = [0.1000000000, 0.1000000000, 0.1000000000]) {
				translate(v = [0, 0, 1490.0000000000]) {
					linear_extrude(height = 686.1000000000) {
						polygon(paths = [[0, 1, 2, 3]], points = [[175, 2255], [175, 2425], [345, 2425], [345, 2255]]);
					}
				}
			}
			color(c = [0.9000000000, 0.6000000000, 0.6000000000]) {
				translate(v = [0, 0, 2176.1000000000]) {
					linear_extrude(height = 100.0000000000) {
						polygon(paths = [[0, 1, 2, 3, 4, 5, 6, 7]], points = [[0, -85], [0, 85], [1535, 85], [1535, 525], [1705, 525], [1705, 85], [2300, 85], [2300, -85]]);
					}
				}
			}
			color(c = [0.9000000000, 0.6000000000, 0.6000000000]) {
				translate(v = [0, 0, 2176.1000000000]) {
					linear_extrude(height = 100.0000000000) {
						polygon(paths = [[0, 1, 2, 3, 4, 5, 6, 7, 8, 9, 10, 11]], points = [[1875, 280], [1875, 695], [1345, 695], [1345, 295], [85, 295], [85, 475], [1015, 475], [1015, 825], [1185, 825], [1185, 865], [2215, 865], [2215, 280]]);
					}
				}
			}
			color(c = [0.9000000000, 0.6000000000, 0.6000000000]) {
				translate(v = [0, 0, 2176.1000000000]) {
					linear_extrude(height = 100.0000000000) {
						polygon(paths = [[0, 1, 2, 3]], points = [[1755, 1075], [1755, 1275], [2215, 1275], [2215, 1075]]);
					}
				}
			}
			color(c = [0.9000000000, 0.6000000000, 0.6000000000]) {
				translate(v = [0, 0, 2176.1000000000]) {
					linear_extrude(height = 100.0000000000) {
						polygon(paths = [[0, 1, 2, 3, 4, 5]], points = [[835, 995], [835, 1665], [1235, 1665], [1235, 1415], [1005, 1415], [1005, 995]]);
					}
				}
			}
			color(c = [0.9000000000, 0.6000000000, 0.6000000000]) {
				translate(v = [0, 0, 2176.1000000000]) {
					linear_extrude(height = 100.0000000000) {
						polygon(paths = [[0, 1, 2, 3]], points = [[85, 665], [85, 1990], [325, 1990], [325, 665]]);
					}
				}
			}
			color(c = [0.9000000000, 0.6000000000, 0.6000000000]) {
				translate(v = [0, 0, 2176.1000000000]) {
					linear_extrude(height = 100.0000000000) {
						polygon(paths = [[0, 1, 2, 3, 4, 5, 6, 7, 8, 9]], points = [[1220, 1075], [1220, 1245], [1405, 1245], [1405, 1615], [1525, 1615], [1525, 2405], [1725, 2405], [1725, 1445], [1585, 1445], [1585, 1075]]);
					}
				}
			}
			color(c = [0.9000000000, 0.6000000000, 0.6000000000]) {
				translate(v = [0, 0, 2176.1000000000]) {
					linear_extrude(height = 100.0000000000) {
						polygon(paths = [[0, 1, 2, 3, 4, 5, 6, 7, 8, 9]], points = [[495, 645], [495, 2045], [835, 2045], [835, 2465], [1335, 2465], [1335, 1835], [665, 1835], [665, 825], [845, 825], [845, 645]]);
					}
				}
			}
			color(c = [0.9000000000, 0.6000000000, 0.6000000000]) {
				translate(v = [0, 0, 2176.1000000000]) {
					linear_extrude(height = 100.0000000000) {
						polygon(paths = [[0, 1, 2, 3, 4, 5, 6, 7, 8, 9, 10, 11]], points = [[1895, 1455], [1895, 2635], [345, 2635], [345, 2175], [135, 2175], [135, 2635], [0, 2635], [0, 2805], [2300, 2805], [2300, 2635], [2215, 2635], [2215, 1455]]);
					}
				}
			}
			color(c = [0.5000000000, 0.5000000000, 0.5000000000]) {
				translate(v = [0, 0, 2276.1000000000]) {
					linear_extrude(height = 340.0000000000) {
						polygon(paths = [[0, 1, 2, 3]], points = [[145, -85], [145, 85], [315, 85], [315, -85]]);
					}
				}
			}
			color(c = [0.5000000000, 0.5000000000, 0.5000000000]) {
				translate(v = [0, 0, 2276.1000000000]) {
					linear_extrude(height = 340.0000000000) {
						polygon(paths = [[0, 1, 2, 3]], points = [[605, -85], [605, 85], [775, 85], [775, -85]]);
					}
				}
			}
			color(c = [0.5000000000, 0.5000000000, 0.5000000000]) {
				translate(v = [0, 0, 2276.1000000000]) {
					linear_extrude(height = 340.0000000000) {
						polygon(paths = [[0, 1, 2, 3]], points = [[1065, -85], [1065, 85], [1235, 85], [1235, -85]]);
					}
				}
			}
			color(c = [0.5000000000, 0.5000000000, 0.5000000000]) {
				translate(v = [0, 0, 2276.1000000000]) {
					linear_extrude(height = 340.0000000000) {
						polygon(paths = [[0, 1, 2, 3]], points = [[1525, -85], [1525, 85], [1695, 85], [1695, -85]]);
					}
				}
			}
			color(c = [0.5000000000, 0.5000000000, 0.5000000000]) {
				translate(v = [0, 0, 2276.1000000000]) {
					linear_extrude(height = 340.0000000000) {
						polygon(paths = [[0, 1, 2, 3]], points = [[1985, -85], [1985, 85], [2155, 85], [2155, -85]]);
					}
				}
			}
			color(c = [0.5000000000, 0.5000000000, 0.5000000000]) {
				translate(v = [0, 0, 2276.1000000000]) {
					linear_extrude(height = 340.0000000000) {
						polygon(paths = [[0, 1, 2, 3]], points = [[145, 2635], [145, 2805], [315, 2805], [315, 2635]]);
					}
				}
			}
			color(c = [0.5000000000, 0.5000000000, 0.5000000000]) {
				translate(v = [0, 0, 2276.1000000000]) {
					linear_extrude(height = 340.0000000000) {
						polygon(paths = [[0, 1, 2, 3]], points = [[605, 2635], [605, 2805], [775, 2805], [775, 2635]]);
					}
				}
			}
			color(c = [0.5000000000, 0.5000000000, 0.5000000000]) {
				translate(v = [0, 0, 2276.1000000000]) {
					linear_extrude(height = 340.0000000000) {
						polygon(paths = [[0, 1, 2, 3]], points = [[1065, 2635], [1065, 2805], [1235, 2805], [1235, 2635]]);
					}
				}
			}
			color(c = [0.5000000000, 0.5000000000, 0.5000000000]) {
				translate(v = [0, 0, 2276.1000000000]) {
					linear_extrude(height = 340.0000000000) {
						polygon(paths = [[0, 1, 2, 3]], points = [[1525, 2635], [1525, 2805], [1695, 2805], [1695, 2635]]);
					}
				}
			}
			color(c = [0.5000000000, 0.5000000000, 0.5000000000]) {
				translate(v = [0, 0, 2276.1000000000]) {
					linear_extrude(height = 340.0000000000) {
						polygon(paths = [[0, 1, 2, 3]], points = [[1985, 2635], [1985, 2805], [2155, 2805], [2155, 2635]]);
					}
				}
			}
			color(c = [0.3000000000, 0.3000000000, 1]) {
				translate(v = [0, 0, 2616.1000000000]) {
					linear_extrude(height = 360.0000000000) {
						polygon(paths = [[0, 1, 2, 3]], points = [[0, -240], [0, 240], [2300, 240], [2300, -240]]);
					}
				}
			}
			color(c = [0.3000000000, 0.3000000000, 1]) {
				translate(v = [0, 0, 2616.1000000000]) {
					linear_extrude(height = 360.0000000000) {
						polygon(paths = [[0, 1, 2, 3]], points = [[0, 2480], [0, 2960], [2300, 2960], [2300, 2480]]);
					}
				}
			}
		}
	}
}
